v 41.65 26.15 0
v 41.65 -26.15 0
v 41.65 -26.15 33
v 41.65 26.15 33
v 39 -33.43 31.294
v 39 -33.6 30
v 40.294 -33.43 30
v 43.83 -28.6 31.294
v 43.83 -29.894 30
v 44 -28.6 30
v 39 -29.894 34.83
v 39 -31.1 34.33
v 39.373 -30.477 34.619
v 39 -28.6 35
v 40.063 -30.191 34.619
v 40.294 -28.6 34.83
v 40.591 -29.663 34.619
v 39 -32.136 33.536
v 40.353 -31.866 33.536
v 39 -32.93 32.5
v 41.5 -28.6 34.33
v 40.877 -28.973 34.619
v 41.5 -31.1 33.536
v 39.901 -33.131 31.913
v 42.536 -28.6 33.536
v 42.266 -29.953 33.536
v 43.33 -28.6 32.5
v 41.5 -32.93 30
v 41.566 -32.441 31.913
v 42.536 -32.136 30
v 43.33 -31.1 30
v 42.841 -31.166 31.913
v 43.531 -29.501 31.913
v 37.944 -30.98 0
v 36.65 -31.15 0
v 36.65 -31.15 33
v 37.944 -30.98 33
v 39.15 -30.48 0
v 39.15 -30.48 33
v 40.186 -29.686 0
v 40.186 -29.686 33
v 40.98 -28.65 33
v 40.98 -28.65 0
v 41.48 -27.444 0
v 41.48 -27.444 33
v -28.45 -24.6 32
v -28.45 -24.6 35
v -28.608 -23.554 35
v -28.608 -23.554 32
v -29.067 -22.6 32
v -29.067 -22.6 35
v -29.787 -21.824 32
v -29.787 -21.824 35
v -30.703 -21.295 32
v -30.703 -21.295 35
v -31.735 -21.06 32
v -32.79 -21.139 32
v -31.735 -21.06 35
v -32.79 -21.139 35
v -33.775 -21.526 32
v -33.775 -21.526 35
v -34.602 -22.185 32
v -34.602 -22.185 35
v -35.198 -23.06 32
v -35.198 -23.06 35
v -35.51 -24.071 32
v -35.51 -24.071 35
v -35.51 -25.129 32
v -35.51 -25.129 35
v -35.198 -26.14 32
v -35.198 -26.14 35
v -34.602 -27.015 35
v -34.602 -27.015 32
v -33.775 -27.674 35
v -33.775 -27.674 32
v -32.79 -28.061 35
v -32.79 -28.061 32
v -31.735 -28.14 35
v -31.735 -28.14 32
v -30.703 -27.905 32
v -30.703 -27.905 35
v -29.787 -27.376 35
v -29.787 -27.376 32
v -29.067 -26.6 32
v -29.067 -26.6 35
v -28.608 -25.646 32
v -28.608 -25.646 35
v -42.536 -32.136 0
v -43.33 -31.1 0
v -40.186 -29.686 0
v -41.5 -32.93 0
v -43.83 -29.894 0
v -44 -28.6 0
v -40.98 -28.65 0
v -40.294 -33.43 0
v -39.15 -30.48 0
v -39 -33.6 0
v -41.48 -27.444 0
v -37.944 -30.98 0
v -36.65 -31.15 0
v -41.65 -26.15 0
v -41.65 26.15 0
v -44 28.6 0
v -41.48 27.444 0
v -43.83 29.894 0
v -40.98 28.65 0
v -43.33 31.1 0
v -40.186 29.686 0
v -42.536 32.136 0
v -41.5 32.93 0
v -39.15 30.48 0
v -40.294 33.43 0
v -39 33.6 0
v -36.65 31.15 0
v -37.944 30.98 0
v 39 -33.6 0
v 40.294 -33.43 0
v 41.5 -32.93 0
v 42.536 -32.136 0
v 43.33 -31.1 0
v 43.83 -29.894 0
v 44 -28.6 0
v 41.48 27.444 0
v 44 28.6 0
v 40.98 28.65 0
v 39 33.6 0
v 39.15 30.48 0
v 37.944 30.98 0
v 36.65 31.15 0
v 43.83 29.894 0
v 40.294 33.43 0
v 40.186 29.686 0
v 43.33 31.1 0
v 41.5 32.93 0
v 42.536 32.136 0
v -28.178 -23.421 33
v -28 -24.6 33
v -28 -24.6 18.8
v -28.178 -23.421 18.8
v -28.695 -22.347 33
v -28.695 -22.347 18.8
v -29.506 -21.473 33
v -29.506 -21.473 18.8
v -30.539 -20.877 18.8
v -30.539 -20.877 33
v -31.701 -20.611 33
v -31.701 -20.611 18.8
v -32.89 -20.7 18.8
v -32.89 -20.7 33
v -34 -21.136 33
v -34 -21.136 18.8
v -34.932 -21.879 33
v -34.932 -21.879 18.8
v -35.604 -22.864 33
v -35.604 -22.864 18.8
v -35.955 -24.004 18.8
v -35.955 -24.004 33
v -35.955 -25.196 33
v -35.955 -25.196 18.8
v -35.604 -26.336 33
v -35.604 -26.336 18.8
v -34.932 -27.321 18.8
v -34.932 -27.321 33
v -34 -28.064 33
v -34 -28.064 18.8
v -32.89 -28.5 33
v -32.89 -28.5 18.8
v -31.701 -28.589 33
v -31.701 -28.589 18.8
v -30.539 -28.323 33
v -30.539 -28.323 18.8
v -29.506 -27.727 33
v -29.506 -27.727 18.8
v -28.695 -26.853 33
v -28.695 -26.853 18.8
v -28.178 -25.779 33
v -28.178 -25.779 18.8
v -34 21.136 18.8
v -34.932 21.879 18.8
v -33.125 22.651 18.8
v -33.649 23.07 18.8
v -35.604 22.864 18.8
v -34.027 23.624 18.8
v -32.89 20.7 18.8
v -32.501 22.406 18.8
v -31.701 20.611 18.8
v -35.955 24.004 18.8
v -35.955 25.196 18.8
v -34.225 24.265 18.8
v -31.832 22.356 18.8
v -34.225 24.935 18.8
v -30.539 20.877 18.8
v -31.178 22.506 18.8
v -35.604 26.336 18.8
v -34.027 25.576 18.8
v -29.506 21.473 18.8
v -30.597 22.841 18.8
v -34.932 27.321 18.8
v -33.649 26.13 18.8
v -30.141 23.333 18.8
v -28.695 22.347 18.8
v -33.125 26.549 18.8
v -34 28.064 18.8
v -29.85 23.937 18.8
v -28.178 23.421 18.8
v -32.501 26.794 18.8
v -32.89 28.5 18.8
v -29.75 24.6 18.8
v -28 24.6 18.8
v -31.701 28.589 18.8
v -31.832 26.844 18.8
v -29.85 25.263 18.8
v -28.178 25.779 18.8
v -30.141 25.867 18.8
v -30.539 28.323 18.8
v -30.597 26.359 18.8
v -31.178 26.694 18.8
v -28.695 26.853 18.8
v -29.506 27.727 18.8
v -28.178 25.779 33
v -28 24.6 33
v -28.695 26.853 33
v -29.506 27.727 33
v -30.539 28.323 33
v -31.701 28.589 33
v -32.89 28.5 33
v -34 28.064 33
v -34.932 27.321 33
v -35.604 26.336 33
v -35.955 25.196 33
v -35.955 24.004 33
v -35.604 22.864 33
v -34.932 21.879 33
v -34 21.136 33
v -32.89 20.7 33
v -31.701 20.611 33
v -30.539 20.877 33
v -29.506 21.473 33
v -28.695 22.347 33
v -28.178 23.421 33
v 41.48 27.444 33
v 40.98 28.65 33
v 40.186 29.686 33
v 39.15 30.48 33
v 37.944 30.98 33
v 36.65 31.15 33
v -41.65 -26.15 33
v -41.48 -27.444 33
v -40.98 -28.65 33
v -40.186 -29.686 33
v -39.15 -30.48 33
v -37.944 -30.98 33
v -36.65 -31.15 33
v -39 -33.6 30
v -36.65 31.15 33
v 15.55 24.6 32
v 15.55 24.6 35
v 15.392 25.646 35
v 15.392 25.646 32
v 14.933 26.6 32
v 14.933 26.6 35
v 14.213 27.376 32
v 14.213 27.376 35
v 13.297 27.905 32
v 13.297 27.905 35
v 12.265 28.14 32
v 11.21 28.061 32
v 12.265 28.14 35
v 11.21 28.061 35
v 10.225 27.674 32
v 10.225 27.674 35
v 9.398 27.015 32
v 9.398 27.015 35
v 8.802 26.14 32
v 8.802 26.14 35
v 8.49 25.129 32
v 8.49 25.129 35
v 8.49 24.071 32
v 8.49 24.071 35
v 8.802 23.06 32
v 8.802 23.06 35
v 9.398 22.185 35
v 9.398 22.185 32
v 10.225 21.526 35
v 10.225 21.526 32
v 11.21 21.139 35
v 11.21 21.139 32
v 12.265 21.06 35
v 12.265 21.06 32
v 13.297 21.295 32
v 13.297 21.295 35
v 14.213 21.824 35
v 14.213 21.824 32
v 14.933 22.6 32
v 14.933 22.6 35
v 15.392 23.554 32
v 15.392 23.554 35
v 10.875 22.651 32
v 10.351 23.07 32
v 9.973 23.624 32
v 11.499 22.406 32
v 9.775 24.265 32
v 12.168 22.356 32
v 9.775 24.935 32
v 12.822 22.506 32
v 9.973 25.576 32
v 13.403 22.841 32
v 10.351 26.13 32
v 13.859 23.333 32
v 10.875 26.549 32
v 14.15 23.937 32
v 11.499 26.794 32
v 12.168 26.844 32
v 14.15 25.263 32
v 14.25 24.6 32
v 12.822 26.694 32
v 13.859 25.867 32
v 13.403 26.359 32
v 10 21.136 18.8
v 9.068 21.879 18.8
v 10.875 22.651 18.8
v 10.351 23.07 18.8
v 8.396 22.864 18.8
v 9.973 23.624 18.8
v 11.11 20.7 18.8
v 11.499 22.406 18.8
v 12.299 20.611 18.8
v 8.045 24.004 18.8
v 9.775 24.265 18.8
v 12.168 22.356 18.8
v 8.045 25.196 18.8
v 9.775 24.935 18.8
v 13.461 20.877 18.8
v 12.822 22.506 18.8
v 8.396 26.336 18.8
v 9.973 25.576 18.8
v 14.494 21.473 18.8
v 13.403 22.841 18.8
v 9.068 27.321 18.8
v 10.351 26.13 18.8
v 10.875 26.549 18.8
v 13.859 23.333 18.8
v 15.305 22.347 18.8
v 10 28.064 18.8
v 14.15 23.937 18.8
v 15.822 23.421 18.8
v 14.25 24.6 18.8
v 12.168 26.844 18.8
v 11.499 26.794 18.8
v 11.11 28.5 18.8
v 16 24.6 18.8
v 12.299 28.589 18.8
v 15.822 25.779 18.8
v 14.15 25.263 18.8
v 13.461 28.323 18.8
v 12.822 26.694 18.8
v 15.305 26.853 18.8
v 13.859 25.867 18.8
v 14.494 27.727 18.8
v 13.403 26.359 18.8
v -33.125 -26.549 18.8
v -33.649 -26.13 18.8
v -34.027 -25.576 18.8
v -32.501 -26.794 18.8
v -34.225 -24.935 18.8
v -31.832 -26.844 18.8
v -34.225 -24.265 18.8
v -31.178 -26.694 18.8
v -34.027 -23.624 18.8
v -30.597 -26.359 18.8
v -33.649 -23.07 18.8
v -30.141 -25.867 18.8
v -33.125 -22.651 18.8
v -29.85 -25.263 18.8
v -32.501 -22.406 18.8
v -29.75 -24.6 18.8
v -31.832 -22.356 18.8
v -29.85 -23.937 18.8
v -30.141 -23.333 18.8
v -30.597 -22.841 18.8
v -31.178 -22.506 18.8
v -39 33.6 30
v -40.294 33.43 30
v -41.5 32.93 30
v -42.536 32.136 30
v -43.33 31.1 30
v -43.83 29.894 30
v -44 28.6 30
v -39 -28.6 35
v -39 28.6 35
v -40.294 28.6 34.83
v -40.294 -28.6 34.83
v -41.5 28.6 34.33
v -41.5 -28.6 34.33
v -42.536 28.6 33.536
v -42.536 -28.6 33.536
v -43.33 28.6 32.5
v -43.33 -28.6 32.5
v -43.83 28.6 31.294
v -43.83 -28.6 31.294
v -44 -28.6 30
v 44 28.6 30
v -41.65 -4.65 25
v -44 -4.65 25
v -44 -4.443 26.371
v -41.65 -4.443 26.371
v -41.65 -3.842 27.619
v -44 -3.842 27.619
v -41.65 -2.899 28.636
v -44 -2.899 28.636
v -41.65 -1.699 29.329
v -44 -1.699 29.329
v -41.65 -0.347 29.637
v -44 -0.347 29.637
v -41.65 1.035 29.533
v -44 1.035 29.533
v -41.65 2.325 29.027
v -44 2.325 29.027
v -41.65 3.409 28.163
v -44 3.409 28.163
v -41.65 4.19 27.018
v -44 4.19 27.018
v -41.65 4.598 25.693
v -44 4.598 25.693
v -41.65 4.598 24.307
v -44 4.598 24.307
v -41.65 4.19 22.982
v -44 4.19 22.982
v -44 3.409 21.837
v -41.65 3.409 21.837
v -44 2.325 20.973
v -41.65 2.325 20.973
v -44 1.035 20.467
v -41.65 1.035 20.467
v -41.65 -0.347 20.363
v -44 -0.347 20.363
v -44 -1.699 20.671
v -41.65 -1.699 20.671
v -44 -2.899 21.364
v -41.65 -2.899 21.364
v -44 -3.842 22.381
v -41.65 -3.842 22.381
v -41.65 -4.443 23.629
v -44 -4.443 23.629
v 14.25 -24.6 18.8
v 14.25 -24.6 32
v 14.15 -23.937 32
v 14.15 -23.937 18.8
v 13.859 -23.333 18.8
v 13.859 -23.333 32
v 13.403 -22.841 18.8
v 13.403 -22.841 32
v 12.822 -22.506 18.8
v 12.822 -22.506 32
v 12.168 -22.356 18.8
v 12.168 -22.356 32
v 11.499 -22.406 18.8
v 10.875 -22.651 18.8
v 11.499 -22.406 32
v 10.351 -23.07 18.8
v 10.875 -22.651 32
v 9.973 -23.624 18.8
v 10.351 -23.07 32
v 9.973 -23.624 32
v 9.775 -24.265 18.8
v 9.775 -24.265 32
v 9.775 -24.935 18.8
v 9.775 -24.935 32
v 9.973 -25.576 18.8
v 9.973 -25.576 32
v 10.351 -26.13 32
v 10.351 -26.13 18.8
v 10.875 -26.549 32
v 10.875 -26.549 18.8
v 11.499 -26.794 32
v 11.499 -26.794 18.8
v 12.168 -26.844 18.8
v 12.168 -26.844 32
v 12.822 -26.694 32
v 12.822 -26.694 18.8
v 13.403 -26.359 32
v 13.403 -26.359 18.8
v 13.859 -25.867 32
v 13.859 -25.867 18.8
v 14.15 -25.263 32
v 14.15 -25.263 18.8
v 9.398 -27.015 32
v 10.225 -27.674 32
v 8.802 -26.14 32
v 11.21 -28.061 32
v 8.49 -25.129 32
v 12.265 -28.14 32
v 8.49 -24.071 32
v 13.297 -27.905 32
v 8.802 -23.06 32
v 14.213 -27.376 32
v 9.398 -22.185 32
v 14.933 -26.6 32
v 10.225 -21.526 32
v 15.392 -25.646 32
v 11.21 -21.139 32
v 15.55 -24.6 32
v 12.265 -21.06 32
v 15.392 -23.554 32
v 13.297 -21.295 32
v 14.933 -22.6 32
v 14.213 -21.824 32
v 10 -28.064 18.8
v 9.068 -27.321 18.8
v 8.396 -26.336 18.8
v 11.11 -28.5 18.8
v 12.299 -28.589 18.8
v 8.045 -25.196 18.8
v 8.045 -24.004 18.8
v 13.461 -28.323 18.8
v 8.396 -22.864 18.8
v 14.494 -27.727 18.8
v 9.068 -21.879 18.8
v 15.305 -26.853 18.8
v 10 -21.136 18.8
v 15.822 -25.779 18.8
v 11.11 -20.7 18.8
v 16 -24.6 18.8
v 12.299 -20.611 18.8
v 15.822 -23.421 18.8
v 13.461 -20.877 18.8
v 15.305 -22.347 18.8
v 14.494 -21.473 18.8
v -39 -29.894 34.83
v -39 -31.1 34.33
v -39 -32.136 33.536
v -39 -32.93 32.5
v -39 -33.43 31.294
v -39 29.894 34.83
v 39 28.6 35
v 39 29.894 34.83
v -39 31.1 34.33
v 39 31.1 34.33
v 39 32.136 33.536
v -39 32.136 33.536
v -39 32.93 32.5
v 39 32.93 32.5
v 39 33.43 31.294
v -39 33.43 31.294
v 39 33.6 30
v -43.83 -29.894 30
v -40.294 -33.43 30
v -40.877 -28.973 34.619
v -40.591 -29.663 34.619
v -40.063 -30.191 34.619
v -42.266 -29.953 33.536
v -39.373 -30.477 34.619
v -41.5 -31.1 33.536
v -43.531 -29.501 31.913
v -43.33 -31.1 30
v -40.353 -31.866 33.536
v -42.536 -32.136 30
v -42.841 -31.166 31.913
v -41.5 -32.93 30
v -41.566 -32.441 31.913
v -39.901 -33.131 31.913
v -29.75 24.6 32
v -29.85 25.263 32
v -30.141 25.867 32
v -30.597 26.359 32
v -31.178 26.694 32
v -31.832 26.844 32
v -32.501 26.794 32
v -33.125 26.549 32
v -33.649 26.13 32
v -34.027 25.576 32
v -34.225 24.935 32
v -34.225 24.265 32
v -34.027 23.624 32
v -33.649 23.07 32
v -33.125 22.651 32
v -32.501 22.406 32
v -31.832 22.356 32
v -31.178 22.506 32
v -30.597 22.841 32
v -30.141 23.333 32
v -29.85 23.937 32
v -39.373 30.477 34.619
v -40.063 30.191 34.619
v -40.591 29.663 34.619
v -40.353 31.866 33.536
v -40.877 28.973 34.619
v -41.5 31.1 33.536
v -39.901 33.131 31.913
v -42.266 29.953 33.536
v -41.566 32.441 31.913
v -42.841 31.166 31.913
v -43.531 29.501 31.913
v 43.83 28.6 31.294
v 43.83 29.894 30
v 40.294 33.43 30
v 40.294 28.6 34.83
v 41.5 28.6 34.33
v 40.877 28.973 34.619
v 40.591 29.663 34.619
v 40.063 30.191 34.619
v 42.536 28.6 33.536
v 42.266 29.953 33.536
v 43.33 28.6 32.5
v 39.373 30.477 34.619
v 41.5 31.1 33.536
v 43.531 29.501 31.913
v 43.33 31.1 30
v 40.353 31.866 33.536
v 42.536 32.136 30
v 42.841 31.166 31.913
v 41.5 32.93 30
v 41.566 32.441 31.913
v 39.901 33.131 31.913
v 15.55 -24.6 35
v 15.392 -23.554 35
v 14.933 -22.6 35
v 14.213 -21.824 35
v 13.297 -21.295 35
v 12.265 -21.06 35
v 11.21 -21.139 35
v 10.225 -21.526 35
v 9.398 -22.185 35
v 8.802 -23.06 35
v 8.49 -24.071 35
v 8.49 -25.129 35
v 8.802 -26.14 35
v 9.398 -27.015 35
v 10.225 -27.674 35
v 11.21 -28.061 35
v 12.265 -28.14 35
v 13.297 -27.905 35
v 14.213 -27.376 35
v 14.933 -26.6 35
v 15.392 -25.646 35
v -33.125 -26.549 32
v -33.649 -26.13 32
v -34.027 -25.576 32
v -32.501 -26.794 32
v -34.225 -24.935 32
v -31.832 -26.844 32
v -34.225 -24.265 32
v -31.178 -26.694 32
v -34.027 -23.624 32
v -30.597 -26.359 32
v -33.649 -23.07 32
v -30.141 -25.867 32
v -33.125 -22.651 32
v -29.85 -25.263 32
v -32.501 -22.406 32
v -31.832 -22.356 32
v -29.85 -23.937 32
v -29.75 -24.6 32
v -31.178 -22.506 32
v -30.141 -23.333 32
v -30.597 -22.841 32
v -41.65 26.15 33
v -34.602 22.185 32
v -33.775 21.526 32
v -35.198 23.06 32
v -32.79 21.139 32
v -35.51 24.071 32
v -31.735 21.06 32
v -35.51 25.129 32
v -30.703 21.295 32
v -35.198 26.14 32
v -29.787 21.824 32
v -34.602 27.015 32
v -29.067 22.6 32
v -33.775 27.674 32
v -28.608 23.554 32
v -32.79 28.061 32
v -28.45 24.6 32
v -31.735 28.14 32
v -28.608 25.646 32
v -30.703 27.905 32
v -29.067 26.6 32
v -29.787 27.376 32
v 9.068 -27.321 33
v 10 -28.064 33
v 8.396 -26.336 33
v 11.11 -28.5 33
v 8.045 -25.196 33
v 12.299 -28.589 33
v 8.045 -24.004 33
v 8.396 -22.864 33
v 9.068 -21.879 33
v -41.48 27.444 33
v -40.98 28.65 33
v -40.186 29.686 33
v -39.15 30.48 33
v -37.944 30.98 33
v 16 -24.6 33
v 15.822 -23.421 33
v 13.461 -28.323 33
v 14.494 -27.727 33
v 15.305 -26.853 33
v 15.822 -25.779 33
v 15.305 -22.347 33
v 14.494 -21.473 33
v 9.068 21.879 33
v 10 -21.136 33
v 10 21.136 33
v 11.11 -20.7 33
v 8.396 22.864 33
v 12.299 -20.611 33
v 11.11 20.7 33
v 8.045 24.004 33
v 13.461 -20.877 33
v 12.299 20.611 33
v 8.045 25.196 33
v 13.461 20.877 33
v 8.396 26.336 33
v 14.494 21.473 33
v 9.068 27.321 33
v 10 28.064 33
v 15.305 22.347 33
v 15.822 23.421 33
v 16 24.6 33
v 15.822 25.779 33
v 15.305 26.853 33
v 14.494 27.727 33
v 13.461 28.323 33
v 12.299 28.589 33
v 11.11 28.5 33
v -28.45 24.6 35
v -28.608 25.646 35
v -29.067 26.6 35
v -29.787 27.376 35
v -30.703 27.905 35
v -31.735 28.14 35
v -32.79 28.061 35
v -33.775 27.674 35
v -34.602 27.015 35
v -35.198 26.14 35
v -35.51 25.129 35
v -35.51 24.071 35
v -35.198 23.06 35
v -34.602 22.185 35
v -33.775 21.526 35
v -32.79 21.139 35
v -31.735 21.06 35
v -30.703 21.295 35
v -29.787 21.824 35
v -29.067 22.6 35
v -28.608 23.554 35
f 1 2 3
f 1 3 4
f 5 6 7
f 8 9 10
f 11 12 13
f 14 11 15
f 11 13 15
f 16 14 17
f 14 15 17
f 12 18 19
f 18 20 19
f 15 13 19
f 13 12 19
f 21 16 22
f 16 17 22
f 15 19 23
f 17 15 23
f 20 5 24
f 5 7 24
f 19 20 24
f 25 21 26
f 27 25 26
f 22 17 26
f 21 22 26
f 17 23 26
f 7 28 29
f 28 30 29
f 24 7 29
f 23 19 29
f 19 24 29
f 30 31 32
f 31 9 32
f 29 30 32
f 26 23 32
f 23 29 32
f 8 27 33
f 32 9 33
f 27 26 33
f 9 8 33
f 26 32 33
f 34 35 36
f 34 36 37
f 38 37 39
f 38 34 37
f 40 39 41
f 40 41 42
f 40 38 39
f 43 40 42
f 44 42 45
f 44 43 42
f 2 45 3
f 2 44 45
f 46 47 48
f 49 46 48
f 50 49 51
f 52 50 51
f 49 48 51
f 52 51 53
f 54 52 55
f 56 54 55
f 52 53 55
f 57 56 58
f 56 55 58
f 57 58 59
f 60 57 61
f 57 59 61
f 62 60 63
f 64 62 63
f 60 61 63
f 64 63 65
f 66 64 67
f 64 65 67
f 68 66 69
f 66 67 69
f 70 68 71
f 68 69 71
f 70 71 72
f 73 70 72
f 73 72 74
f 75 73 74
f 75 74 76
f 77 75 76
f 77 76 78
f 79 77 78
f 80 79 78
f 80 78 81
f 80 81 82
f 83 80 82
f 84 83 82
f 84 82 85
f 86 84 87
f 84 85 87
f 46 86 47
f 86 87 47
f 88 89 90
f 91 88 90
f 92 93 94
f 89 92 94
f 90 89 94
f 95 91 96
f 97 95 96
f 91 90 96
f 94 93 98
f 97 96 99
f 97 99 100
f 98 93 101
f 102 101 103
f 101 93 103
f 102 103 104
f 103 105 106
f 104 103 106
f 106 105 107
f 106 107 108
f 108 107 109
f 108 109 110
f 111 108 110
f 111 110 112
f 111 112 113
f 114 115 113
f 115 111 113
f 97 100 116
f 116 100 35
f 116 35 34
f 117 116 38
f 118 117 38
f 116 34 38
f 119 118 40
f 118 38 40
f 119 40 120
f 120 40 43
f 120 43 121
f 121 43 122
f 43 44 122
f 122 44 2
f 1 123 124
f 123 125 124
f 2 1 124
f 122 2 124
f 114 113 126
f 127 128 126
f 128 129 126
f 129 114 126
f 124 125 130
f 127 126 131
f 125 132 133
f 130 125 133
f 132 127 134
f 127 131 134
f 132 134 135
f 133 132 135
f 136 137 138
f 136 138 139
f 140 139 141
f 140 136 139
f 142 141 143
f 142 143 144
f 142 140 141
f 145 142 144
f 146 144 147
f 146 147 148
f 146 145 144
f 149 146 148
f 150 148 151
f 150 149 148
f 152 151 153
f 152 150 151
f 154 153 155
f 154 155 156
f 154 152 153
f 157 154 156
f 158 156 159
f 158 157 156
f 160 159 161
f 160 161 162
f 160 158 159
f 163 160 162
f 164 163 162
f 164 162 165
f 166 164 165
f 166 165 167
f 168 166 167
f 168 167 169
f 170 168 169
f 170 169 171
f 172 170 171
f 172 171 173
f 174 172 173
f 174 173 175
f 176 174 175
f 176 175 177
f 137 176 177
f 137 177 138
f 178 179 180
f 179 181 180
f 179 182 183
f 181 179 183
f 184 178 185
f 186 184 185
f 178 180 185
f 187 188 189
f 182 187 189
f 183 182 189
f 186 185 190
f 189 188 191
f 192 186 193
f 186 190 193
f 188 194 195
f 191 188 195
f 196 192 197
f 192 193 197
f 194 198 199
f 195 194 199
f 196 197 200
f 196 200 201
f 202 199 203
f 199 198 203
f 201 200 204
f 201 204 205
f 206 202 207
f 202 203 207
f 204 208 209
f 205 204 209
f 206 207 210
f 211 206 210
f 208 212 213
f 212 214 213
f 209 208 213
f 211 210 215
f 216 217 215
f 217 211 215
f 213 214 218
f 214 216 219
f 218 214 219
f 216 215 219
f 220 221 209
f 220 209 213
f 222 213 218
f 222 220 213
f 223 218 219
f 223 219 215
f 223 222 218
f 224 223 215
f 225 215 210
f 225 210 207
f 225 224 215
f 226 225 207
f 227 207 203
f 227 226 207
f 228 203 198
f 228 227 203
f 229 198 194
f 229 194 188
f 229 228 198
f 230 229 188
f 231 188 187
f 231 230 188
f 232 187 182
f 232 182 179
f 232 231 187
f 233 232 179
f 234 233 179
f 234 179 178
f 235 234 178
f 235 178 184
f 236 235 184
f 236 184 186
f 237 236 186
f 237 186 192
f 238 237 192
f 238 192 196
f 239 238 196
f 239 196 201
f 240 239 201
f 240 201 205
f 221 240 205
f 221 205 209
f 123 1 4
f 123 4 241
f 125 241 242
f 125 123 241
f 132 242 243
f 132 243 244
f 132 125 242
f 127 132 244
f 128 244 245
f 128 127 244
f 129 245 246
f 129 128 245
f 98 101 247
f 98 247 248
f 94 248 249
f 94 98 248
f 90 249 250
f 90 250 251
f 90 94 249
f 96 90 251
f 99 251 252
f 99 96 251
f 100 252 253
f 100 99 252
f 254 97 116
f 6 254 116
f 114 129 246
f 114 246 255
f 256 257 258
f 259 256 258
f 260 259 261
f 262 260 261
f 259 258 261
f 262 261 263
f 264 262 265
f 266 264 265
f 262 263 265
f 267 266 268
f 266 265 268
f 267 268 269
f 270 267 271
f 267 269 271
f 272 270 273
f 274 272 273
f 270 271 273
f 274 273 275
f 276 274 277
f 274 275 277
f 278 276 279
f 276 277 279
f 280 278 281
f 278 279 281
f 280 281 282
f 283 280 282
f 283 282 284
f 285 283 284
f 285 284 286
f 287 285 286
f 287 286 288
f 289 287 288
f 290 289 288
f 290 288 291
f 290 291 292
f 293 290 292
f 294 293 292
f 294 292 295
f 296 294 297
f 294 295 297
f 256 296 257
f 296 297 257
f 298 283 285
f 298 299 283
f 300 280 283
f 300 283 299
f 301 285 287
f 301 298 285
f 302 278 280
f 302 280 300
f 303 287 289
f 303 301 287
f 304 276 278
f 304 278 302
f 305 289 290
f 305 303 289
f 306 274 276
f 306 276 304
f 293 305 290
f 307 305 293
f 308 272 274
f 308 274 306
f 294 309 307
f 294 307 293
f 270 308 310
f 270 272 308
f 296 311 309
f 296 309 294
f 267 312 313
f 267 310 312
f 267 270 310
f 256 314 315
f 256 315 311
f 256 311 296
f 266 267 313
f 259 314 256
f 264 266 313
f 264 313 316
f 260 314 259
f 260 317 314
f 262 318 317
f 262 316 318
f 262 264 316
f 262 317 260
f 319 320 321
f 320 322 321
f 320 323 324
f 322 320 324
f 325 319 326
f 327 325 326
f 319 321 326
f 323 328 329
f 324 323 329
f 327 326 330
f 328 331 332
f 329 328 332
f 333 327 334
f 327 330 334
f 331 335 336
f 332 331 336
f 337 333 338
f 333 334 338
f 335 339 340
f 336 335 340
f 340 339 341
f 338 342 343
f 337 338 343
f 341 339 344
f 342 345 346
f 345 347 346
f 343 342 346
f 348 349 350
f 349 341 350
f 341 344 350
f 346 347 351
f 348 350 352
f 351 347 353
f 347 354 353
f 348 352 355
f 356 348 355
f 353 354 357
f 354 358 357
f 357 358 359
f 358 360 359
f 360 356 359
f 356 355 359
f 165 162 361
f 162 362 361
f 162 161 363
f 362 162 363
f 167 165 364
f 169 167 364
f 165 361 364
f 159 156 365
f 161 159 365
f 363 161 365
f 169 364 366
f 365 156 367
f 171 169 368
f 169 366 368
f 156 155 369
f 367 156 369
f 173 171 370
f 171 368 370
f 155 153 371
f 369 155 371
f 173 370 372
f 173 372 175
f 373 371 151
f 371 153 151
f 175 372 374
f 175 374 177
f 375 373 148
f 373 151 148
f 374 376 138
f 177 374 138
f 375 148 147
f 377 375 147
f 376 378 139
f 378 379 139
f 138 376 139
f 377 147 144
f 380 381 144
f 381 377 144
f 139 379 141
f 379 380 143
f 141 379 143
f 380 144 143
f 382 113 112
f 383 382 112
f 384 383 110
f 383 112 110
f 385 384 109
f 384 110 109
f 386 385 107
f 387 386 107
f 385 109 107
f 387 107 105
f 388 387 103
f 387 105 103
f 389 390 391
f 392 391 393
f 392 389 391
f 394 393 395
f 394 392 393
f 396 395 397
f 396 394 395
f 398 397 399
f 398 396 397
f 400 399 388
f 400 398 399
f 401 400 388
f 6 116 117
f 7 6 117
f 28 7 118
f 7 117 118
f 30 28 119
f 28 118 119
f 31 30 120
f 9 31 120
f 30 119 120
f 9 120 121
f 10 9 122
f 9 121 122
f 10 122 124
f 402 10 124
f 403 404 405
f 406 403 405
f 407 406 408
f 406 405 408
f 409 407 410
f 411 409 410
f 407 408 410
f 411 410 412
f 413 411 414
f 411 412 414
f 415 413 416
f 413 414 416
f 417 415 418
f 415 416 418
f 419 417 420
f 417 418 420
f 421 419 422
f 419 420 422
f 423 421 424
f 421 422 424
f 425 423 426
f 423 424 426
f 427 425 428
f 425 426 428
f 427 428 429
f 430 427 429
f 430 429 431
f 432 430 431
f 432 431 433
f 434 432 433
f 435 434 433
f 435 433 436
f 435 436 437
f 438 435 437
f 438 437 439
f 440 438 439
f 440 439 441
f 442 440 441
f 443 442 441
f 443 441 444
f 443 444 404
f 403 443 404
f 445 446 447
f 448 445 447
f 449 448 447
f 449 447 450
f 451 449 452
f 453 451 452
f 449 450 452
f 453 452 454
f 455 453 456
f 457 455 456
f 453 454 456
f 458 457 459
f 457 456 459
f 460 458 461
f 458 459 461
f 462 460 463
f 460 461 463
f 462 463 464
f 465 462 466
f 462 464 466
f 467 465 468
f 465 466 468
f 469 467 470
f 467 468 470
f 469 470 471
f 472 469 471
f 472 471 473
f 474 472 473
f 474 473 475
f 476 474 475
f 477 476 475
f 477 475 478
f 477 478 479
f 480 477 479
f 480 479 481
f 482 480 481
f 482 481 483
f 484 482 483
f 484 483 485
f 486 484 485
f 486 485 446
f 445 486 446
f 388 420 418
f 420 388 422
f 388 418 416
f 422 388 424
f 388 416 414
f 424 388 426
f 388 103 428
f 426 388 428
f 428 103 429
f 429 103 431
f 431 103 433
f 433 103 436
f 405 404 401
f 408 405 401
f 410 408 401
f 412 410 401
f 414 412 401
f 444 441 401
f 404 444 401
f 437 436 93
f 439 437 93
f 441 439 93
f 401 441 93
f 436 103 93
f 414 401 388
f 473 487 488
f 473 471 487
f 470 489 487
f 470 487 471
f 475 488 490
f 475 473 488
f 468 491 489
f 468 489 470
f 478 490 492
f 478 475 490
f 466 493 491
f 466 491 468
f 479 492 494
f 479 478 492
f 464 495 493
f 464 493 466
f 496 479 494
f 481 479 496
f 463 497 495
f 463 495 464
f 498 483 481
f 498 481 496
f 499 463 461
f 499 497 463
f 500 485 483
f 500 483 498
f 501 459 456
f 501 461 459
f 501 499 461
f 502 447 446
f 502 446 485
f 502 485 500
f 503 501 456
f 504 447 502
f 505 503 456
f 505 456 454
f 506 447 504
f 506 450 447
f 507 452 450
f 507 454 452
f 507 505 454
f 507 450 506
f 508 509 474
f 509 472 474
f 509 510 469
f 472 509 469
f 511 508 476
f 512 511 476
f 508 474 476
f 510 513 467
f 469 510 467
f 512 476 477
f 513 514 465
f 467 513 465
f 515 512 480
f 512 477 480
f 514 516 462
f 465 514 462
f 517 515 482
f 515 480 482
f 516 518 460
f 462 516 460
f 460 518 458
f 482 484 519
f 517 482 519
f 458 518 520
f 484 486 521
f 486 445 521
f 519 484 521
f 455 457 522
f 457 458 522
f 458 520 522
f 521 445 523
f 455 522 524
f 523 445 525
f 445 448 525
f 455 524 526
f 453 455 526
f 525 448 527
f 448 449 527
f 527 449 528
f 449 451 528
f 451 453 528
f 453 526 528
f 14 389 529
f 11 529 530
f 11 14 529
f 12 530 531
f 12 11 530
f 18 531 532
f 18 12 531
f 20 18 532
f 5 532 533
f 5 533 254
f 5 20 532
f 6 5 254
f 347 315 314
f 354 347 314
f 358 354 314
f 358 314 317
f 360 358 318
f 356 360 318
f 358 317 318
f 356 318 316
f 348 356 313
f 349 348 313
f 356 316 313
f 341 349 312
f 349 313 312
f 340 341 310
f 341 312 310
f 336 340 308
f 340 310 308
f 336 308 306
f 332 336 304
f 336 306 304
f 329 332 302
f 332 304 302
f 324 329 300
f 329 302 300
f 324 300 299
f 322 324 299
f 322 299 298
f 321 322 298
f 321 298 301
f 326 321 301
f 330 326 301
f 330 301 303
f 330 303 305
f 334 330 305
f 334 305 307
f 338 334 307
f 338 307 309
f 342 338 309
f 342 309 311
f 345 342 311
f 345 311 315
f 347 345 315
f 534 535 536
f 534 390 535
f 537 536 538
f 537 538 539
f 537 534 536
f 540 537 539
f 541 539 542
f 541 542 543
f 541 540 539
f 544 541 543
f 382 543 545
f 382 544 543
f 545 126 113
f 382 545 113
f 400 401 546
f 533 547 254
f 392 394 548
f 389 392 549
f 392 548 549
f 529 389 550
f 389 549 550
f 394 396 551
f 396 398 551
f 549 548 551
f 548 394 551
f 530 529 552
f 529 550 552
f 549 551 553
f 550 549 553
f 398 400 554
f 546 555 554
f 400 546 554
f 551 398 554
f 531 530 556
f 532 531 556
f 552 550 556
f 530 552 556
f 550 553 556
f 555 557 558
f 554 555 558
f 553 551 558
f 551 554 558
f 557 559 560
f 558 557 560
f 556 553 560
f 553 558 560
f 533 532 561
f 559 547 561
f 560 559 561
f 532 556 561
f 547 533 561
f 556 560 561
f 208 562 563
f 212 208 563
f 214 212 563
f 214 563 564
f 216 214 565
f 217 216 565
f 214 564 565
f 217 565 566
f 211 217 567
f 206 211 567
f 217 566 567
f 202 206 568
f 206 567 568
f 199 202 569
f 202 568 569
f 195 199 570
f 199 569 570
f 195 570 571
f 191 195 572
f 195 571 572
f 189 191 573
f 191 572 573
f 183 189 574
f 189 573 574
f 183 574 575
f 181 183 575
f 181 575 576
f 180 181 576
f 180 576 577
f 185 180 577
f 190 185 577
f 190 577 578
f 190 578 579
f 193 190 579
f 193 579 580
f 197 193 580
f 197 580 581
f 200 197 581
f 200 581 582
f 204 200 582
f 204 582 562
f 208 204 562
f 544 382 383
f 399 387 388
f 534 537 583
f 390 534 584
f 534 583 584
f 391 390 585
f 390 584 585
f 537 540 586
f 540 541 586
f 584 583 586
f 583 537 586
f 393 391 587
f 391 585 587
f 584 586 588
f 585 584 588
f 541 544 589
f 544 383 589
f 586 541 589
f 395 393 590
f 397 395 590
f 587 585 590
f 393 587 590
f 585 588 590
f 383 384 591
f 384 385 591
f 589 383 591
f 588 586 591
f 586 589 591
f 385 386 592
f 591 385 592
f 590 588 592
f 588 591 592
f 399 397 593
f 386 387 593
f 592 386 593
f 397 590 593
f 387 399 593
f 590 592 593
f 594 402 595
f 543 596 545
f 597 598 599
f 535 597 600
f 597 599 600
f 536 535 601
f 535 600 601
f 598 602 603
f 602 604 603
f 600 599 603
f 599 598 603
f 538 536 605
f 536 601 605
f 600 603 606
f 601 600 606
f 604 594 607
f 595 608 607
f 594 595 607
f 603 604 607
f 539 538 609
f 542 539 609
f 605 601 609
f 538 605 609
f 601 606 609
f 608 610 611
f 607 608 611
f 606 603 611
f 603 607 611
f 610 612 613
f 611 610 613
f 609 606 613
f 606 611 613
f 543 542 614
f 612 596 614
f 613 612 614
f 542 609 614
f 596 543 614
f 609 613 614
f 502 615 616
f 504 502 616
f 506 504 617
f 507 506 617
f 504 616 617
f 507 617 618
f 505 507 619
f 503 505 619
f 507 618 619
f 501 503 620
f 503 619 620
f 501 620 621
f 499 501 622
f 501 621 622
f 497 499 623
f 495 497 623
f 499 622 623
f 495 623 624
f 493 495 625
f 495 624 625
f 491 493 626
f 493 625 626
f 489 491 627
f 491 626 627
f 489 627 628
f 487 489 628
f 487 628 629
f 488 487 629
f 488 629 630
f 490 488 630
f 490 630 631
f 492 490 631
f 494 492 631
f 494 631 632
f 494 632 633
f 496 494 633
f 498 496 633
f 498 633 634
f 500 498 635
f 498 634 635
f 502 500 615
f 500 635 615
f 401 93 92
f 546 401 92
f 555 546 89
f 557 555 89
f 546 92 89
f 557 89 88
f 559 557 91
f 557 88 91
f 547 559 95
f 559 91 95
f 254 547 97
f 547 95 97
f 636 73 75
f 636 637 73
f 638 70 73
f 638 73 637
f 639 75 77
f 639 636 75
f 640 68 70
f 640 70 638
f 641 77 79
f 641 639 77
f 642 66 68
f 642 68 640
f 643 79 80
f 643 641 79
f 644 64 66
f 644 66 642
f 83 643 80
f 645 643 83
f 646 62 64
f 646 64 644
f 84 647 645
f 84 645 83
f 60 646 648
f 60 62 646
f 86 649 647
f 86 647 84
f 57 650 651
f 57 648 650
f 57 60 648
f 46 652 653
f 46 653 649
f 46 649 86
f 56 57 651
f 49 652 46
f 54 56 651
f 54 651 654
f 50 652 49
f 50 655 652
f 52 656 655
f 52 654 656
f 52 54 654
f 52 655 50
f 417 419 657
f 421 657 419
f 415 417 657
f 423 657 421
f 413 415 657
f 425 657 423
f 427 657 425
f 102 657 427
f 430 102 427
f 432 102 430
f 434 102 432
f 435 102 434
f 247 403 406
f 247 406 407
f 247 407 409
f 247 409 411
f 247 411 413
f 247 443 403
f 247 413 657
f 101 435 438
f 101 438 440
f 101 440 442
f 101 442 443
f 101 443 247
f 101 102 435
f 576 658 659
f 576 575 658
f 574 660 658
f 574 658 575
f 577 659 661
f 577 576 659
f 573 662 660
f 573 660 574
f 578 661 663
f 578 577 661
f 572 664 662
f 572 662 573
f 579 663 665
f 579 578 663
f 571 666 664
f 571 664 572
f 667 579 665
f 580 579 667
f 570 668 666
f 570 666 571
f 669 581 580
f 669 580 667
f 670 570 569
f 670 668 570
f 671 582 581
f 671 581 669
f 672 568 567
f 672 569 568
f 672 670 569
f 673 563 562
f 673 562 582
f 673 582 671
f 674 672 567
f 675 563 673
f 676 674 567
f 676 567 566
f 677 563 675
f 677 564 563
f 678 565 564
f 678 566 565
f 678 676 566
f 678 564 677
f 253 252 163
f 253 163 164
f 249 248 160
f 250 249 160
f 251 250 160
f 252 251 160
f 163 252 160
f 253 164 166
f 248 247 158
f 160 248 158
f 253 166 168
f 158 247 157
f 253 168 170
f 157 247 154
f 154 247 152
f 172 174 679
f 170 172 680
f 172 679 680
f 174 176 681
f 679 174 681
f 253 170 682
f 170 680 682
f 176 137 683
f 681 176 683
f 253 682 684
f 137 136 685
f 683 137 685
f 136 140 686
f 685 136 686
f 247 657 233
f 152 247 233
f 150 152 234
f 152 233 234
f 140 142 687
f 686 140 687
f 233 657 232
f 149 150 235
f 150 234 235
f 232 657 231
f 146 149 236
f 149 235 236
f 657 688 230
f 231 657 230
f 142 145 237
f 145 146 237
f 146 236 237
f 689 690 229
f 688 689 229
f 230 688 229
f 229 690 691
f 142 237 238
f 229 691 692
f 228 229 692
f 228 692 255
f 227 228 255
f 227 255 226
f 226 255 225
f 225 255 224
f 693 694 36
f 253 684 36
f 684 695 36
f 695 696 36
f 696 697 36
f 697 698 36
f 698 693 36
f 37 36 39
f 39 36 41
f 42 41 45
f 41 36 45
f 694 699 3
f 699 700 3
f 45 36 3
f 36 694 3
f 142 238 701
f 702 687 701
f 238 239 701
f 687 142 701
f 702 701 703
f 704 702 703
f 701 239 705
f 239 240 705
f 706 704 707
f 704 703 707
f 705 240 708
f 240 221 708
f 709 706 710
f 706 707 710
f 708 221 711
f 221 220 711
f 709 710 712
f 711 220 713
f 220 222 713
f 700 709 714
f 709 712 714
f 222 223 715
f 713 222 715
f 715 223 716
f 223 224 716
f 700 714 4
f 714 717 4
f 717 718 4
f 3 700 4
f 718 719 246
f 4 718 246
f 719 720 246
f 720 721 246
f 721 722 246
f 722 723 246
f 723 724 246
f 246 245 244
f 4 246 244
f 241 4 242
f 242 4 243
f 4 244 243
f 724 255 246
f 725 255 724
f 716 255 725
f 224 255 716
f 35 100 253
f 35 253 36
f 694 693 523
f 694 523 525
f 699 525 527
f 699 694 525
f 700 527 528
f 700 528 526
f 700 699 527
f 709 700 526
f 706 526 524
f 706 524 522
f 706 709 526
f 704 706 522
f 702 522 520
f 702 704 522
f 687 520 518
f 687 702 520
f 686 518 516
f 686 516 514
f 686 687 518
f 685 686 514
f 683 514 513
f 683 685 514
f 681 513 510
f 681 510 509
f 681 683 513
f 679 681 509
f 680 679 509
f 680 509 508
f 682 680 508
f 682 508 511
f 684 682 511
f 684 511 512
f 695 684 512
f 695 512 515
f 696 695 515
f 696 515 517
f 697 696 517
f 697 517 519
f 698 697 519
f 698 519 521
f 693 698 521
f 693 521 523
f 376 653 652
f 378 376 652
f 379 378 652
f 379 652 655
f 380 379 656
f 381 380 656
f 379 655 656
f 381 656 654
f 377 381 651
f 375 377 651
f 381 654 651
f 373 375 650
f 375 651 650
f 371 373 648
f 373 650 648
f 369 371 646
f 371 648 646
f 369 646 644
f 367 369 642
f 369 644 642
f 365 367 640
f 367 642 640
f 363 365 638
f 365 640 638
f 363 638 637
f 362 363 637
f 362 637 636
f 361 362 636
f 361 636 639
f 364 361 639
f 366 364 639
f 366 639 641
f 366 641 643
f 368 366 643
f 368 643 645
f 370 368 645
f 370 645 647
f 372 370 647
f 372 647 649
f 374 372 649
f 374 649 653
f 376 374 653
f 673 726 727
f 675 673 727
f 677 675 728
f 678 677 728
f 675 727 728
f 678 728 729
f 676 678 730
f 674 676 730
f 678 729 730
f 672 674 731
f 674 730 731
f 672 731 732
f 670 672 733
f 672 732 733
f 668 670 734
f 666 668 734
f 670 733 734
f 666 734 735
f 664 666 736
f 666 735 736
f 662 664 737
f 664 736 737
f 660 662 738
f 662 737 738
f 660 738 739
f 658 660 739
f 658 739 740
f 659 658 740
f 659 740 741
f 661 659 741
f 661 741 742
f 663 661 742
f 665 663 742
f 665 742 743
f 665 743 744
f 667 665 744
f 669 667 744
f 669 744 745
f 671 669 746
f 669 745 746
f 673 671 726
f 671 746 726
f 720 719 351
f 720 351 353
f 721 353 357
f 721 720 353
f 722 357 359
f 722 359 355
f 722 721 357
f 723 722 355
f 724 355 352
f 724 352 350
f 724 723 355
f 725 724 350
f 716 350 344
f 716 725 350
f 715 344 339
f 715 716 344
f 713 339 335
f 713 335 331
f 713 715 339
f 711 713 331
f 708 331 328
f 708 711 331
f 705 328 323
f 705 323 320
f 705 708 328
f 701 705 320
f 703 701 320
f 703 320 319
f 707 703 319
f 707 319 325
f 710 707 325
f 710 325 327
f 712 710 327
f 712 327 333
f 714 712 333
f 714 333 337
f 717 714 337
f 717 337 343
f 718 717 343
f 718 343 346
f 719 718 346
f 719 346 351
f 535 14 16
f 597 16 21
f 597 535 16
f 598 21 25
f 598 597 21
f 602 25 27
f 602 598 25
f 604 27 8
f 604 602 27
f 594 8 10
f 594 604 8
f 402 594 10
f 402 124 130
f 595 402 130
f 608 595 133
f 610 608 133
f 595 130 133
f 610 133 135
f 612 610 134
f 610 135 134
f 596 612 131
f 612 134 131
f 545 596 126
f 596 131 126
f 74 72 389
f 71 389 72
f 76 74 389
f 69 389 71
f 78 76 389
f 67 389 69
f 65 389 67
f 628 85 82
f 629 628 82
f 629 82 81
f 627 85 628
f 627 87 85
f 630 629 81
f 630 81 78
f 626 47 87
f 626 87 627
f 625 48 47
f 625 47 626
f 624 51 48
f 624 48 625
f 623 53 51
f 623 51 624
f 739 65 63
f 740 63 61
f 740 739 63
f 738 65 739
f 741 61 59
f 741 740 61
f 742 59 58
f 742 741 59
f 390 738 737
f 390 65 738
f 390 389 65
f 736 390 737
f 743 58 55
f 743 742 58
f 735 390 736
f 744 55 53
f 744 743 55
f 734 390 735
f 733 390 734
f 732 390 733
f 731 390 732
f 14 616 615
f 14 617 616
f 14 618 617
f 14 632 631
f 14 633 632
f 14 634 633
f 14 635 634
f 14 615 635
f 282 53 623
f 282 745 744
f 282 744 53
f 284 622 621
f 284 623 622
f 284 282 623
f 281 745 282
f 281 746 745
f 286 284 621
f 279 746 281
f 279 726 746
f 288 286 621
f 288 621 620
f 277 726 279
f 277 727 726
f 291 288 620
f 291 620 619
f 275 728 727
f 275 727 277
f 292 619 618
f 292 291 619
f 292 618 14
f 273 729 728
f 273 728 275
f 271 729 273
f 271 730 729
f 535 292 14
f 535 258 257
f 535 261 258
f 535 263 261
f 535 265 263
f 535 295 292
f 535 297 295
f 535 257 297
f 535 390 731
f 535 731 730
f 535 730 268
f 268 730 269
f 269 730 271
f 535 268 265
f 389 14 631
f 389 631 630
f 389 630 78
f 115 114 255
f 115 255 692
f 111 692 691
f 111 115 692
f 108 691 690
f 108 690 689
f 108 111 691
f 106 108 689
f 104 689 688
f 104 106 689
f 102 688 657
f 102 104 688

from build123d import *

# Parameters (mm, degrees)
F1_DEPTH  = 35
F3_DEPTH  = 33
F5_R      = 4
F6_DEPTH  = 16.2
F4_R      = 2.25
F7_DEPTH  = 25
F8_R      = 3.55
F9_DEPTH  = 3
F10_R     = 4.65
F11_DEPTH = 5
F12_R     = 5


with BuildPart() as f1:
    # F0 (on Top) → F1 (new body)
    with BuildSketch(Plane.XY):
        with BuildLine():
            Line((39, 33.6), (-39, 33.6))
            ThreePointArc((-39, 33.6), (-42.5355339059, 32.1355339059), (-44, 28.6))
            Line((-44, 28.6), (-44, -28.6))
            ThreePointArc((-44, -28.6), (-42.5355339059, -32.1355339059), (-39, -33.6))
            Line((-39, -33.6), (39, -33.6))
            ThreePointArc((39, -33.6), (42.5355339059, -32.1355339059), (44, -28.6))
            Line((44, -28.6), (44, 28.6))
            ThreePointArc((44, 28.6), (42.5355339059, 32.1355339059), (39, 33.6))
        make_face()
        with BuildLine():
            ThreePointArc((-41.65, 26.15), (-40.1855339059, 29.6855339059), (-36.65, 31.15))
            Line((-36.65, 31.15), (36.65, 31.15))
            ThreePointArc((36.65, 31.15), (40.1855339059, 29.6855339059), (41.65, 26.15))
            Line((41.65, 26.15), (41.65, -26.15))
            ThreePointArc((41.65, -26.15), (40.1855339059, -29.6855339059), (36.65, -31.15))
            Line((36.65, -31.15), (-36.65, -31.15))
            ThreePointArc((-36.65, -31.15), (-40.1855339059, -29.6855339059), (-41.65, -26.15))
            Line((-41.65, -26.15), (-41.65, 26.15))
        make_face(mode=Mode.SUBTRACT)
        with BuildLine():
            Line((36.65, 31.15), (-36.65, 31.15))
            ThreePointArc((-36.65, 31.15), (-40.1855339059, 29.6855339059), (-41.65, 26.15))
            Line((-41.65, 26.15), (-41.65, -26.15))
            ThreePointArc((-41.65, -26.15), (-40.1855339059, -29.6855339059), (-36.65, -31.15))
            Line((-36.65, -31.15), (36.65, -31.15))
            ThreePointArc((36.65, -31.15), (40.1855339059, -29.6855339059), (41.65, -26.15))
            Line((41.65, -26.15), (41.65, 26.15))
            ThreePointArc((41.65, 26.15), (40.1855339059, 29.6855339059), (36.65, 31.15))
        make_face()
    extrude(amount=F1_DEPTH)

    # F2 (on Top) → F3 (cut)
    with BuildSketch(Plane.XY):
        with BuildLine():
            ThreePointArc((41.65, 26.15), (40.1855339059, 29.6855339059), (36.65, 31.15))
            Line((36.65, 31.15), (-36.65, 31.15))
            ThreePointArc((-36.65, 31.15), (-40.1855339059, 29.6855339059), (-41.65, 26.15))
            Line((-41.65, 26.15), (-41.65, -26.15))
            ThreePointArc((-41.65, -26.15), (-40.1855339059, -29.6855339059), (-36.65, -31.15))
            Line((-36.65, -31.15), (36.65, -31.15))
            ThreePointArc((36.65, -31.15), (40.1855339059, -29.6855339059), (41.65, -26.15))
            Line((41.65, -26.15), (41.65, 26.15))
        make_face()
    extrude(amount=F3_DEPTH, mode=Mode.SUBTRACT)

    # F5 (on face) → F6 (join)
    with BuildSketch(Plane.XY.offset(35)):
        with Locations((-32, 24.6)):
            Circle(F5_R)
        with Locations((12, 24.6)):
            Circle(F5_R)
        with Locations((-32, -24.6)):
            Circle(F5_R)
        with Locations((12, -24.6)):
            Circle(F5_R)
    extrude(amount=-F6_DEPTH)

    # F4 (on face) → F7 (cut)
    with BuildSketch(Plane.XY.offset(35)):
        with Locations((-32, 24.6)):
            Circle(F4_R)
        with Locations((-32, -24.6)):
            Circle(F4_R)
        with Locations((12, 24.6)):
            Circle(F4_R)
        with Locations((12, -24.6)):
            Circle(F4_R)
    extrude(amount=-F7_DEPTH, mode=Mode.SUBTRACT)

    # F8 (on face) → F9 (cut)
    with BuildSketch(Plane.XY.offset(35)):
        with Locations((-32, 24.6)):
            Circle(F8_R)
        with Locations((12, 24.6)):
            Circle(F8_R)
        with Locations((12, -24.6)):
            Circle(F8_R)
        with Locations((-32, -24.6)):
            Circle(F8_R)
    extrude(amount=-F9_DEPTH, mode=Mode.SUBTRACT)

    # F10 (on face) → F11 (cut)
    with BuildSketch(Plane(origin=(-44, 0, 0), x_dir=(0, -1, 0), z_dir=(-1, 0, 0))):
        with Locations((0, 25)):
            Circle(F10_R)
    extrude(amount=-F11_DEPTH, mode=Mode.SUBTRACT)

    # F12
    f12_edges = [f1.edges().sort_by_distance(p)[0] for p in [
        (0, 33.6, 35),
    ]]
    fillet(f12_edges, radius=F12_R)


solid = f1.part
